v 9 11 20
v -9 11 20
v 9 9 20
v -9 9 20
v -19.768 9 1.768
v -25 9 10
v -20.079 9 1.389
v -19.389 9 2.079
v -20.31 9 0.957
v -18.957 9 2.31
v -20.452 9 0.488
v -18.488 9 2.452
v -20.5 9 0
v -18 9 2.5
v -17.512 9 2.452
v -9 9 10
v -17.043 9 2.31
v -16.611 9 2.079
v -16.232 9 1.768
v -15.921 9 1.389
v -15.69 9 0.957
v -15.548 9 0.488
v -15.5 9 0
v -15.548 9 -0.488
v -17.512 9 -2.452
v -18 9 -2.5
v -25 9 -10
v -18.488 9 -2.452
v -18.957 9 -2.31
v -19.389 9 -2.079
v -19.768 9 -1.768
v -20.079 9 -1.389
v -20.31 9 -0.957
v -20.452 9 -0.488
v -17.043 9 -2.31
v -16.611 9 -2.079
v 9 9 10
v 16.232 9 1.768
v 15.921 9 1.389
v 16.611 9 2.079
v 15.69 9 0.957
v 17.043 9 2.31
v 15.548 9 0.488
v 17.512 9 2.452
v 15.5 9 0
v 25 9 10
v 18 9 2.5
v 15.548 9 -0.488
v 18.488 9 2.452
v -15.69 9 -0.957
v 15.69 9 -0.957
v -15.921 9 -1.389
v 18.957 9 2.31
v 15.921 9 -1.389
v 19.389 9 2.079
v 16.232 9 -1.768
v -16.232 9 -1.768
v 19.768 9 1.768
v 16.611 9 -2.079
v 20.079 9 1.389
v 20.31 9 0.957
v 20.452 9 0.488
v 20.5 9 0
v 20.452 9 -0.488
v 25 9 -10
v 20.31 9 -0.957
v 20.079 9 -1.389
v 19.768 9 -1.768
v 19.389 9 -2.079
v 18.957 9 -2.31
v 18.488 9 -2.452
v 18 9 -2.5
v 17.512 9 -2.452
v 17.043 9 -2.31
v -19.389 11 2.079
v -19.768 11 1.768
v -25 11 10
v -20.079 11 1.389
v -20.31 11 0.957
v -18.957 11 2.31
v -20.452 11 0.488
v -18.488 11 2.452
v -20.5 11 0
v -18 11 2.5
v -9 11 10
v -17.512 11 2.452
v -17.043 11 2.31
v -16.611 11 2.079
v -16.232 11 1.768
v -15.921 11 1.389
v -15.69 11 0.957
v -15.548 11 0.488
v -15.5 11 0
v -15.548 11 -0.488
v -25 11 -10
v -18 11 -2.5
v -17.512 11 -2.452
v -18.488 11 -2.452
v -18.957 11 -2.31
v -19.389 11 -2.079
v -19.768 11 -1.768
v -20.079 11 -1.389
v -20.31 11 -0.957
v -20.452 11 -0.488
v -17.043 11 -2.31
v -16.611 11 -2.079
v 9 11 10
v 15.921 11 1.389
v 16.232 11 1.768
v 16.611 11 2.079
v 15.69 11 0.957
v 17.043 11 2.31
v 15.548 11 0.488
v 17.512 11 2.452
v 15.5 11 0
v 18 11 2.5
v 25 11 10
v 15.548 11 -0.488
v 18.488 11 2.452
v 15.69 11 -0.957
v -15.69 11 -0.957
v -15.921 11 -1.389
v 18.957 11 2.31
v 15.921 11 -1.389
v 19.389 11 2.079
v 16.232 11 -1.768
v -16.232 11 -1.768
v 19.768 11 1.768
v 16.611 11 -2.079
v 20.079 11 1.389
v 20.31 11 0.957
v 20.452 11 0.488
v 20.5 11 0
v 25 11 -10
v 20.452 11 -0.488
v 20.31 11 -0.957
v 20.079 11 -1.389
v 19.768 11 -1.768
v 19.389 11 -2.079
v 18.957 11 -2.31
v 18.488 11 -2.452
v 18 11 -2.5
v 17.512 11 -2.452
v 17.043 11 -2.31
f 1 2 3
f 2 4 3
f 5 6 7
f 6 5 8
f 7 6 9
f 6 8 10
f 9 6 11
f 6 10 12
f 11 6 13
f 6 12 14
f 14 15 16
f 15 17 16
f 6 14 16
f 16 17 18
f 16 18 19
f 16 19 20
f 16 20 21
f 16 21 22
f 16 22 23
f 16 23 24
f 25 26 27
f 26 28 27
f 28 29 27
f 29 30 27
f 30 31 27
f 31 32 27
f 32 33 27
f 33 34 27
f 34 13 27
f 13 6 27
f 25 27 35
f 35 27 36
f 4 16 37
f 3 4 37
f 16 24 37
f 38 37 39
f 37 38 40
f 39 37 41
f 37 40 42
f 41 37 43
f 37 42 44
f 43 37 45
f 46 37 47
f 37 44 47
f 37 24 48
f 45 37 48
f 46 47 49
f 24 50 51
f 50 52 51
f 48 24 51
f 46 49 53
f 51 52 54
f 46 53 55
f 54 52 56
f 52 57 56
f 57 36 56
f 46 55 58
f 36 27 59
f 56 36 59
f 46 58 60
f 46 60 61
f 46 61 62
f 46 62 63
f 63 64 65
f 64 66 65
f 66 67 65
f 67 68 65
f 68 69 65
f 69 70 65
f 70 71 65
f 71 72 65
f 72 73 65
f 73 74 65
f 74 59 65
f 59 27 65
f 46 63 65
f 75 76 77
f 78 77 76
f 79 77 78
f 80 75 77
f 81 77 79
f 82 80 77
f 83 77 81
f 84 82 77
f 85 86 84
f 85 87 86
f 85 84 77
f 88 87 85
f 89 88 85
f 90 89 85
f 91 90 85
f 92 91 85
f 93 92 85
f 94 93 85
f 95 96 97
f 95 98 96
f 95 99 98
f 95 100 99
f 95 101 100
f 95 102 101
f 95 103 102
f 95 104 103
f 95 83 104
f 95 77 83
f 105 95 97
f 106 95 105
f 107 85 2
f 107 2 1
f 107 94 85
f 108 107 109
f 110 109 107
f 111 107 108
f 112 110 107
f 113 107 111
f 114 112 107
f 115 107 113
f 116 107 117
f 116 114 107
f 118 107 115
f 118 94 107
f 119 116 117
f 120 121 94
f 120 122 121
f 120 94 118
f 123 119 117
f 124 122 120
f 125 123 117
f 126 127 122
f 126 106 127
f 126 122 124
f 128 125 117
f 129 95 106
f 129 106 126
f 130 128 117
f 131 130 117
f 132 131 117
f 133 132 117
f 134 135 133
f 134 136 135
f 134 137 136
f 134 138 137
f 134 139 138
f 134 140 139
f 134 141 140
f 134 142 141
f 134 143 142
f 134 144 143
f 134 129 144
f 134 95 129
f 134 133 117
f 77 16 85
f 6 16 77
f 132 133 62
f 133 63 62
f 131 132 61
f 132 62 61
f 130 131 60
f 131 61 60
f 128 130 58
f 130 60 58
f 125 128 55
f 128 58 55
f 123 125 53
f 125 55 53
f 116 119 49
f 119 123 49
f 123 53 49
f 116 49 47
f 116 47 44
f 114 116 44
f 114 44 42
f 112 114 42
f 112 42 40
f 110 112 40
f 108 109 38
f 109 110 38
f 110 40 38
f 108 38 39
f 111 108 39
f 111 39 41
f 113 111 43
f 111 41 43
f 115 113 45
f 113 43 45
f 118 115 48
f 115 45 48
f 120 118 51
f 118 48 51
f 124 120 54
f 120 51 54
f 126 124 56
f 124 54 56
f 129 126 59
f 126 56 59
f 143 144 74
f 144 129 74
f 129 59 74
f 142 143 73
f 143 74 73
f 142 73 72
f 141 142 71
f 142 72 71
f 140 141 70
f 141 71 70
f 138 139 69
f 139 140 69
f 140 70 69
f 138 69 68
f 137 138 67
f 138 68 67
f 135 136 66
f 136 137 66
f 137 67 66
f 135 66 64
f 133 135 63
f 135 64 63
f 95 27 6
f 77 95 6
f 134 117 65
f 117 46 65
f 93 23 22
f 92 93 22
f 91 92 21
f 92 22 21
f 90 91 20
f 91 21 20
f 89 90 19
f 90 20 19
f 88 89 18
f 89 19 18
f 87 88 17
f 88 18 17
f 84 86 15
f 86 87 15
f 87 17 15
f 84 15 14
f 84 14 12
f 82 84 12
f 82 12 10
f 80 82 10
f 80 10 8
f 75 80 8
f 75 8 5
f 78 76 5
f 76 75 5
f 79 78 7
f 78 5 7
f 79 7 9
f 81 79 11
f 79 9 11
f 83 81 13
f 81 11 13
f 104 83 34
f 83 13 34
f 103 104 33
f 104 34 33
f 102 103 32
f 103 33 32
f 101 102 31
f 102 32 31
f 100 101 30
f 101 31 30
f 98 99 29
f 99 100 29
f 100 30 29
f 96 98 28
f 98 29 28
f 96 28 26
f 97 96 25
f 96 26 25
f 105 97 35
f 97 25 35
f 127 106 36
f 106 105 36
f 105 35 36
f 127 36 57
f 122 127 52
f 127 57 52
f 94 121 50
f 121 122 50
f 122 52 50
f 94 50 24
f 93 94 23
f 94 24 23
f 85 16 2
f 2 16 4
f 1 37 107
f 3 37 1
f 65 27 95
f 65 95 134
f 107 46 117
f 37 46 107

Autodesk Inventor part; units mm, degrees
ref_plane "YZ Plane" through (0, 0, 0) normal (1, 0, 0) x (0, 1, 0)
ref_plane "XZ Plane" through (0, 0, 0) normal (0, 1, 0) x (-1, 0, 0)
ref_plane "Work Plane1" through (-25, 9, -10) normal (0, 1, 0) x (1, 0, 0)
sketch "Sketch1" plane through (-25, 9, -10) normal (0, 1, 0) x (1, 0, 0)
  line L0 (0, 0) -> (0, -20) projected
  line L1 (50, -20) -> (50, 0) projected
  line L2 (0, 0) -> (50, 0)
  line L3 (50, 0) -> (50, -20)
  line L4 (50, -20) -> (0, -20)
  line L5 (0, -20) -> (0, 0)
  line L6 (34, -20) -> (34, -30) projected
  line L7 (16, -30) -> (34, -30) projected
  line L8 (34, -20) -> (16, -20)
  line L9 (16, -20) -> (16, -30)
  line L10 (16, -30) -> (34, -30)
  line L11 (34, -30) -> (34, -20)
  circle A0 centre (7, -10) radius 2.5 projected
  circle A1 centre (7, -10) radius 2.5
  circle A2 centre (43, -10) radius 2.5 projected
  circle A3 centre (43, -10) radius 2.5
  point P0 (25, -10)
extrude "Extrusion1" add sketch "Sketch1" along normal blind 2
properties part number "gps_lid"
